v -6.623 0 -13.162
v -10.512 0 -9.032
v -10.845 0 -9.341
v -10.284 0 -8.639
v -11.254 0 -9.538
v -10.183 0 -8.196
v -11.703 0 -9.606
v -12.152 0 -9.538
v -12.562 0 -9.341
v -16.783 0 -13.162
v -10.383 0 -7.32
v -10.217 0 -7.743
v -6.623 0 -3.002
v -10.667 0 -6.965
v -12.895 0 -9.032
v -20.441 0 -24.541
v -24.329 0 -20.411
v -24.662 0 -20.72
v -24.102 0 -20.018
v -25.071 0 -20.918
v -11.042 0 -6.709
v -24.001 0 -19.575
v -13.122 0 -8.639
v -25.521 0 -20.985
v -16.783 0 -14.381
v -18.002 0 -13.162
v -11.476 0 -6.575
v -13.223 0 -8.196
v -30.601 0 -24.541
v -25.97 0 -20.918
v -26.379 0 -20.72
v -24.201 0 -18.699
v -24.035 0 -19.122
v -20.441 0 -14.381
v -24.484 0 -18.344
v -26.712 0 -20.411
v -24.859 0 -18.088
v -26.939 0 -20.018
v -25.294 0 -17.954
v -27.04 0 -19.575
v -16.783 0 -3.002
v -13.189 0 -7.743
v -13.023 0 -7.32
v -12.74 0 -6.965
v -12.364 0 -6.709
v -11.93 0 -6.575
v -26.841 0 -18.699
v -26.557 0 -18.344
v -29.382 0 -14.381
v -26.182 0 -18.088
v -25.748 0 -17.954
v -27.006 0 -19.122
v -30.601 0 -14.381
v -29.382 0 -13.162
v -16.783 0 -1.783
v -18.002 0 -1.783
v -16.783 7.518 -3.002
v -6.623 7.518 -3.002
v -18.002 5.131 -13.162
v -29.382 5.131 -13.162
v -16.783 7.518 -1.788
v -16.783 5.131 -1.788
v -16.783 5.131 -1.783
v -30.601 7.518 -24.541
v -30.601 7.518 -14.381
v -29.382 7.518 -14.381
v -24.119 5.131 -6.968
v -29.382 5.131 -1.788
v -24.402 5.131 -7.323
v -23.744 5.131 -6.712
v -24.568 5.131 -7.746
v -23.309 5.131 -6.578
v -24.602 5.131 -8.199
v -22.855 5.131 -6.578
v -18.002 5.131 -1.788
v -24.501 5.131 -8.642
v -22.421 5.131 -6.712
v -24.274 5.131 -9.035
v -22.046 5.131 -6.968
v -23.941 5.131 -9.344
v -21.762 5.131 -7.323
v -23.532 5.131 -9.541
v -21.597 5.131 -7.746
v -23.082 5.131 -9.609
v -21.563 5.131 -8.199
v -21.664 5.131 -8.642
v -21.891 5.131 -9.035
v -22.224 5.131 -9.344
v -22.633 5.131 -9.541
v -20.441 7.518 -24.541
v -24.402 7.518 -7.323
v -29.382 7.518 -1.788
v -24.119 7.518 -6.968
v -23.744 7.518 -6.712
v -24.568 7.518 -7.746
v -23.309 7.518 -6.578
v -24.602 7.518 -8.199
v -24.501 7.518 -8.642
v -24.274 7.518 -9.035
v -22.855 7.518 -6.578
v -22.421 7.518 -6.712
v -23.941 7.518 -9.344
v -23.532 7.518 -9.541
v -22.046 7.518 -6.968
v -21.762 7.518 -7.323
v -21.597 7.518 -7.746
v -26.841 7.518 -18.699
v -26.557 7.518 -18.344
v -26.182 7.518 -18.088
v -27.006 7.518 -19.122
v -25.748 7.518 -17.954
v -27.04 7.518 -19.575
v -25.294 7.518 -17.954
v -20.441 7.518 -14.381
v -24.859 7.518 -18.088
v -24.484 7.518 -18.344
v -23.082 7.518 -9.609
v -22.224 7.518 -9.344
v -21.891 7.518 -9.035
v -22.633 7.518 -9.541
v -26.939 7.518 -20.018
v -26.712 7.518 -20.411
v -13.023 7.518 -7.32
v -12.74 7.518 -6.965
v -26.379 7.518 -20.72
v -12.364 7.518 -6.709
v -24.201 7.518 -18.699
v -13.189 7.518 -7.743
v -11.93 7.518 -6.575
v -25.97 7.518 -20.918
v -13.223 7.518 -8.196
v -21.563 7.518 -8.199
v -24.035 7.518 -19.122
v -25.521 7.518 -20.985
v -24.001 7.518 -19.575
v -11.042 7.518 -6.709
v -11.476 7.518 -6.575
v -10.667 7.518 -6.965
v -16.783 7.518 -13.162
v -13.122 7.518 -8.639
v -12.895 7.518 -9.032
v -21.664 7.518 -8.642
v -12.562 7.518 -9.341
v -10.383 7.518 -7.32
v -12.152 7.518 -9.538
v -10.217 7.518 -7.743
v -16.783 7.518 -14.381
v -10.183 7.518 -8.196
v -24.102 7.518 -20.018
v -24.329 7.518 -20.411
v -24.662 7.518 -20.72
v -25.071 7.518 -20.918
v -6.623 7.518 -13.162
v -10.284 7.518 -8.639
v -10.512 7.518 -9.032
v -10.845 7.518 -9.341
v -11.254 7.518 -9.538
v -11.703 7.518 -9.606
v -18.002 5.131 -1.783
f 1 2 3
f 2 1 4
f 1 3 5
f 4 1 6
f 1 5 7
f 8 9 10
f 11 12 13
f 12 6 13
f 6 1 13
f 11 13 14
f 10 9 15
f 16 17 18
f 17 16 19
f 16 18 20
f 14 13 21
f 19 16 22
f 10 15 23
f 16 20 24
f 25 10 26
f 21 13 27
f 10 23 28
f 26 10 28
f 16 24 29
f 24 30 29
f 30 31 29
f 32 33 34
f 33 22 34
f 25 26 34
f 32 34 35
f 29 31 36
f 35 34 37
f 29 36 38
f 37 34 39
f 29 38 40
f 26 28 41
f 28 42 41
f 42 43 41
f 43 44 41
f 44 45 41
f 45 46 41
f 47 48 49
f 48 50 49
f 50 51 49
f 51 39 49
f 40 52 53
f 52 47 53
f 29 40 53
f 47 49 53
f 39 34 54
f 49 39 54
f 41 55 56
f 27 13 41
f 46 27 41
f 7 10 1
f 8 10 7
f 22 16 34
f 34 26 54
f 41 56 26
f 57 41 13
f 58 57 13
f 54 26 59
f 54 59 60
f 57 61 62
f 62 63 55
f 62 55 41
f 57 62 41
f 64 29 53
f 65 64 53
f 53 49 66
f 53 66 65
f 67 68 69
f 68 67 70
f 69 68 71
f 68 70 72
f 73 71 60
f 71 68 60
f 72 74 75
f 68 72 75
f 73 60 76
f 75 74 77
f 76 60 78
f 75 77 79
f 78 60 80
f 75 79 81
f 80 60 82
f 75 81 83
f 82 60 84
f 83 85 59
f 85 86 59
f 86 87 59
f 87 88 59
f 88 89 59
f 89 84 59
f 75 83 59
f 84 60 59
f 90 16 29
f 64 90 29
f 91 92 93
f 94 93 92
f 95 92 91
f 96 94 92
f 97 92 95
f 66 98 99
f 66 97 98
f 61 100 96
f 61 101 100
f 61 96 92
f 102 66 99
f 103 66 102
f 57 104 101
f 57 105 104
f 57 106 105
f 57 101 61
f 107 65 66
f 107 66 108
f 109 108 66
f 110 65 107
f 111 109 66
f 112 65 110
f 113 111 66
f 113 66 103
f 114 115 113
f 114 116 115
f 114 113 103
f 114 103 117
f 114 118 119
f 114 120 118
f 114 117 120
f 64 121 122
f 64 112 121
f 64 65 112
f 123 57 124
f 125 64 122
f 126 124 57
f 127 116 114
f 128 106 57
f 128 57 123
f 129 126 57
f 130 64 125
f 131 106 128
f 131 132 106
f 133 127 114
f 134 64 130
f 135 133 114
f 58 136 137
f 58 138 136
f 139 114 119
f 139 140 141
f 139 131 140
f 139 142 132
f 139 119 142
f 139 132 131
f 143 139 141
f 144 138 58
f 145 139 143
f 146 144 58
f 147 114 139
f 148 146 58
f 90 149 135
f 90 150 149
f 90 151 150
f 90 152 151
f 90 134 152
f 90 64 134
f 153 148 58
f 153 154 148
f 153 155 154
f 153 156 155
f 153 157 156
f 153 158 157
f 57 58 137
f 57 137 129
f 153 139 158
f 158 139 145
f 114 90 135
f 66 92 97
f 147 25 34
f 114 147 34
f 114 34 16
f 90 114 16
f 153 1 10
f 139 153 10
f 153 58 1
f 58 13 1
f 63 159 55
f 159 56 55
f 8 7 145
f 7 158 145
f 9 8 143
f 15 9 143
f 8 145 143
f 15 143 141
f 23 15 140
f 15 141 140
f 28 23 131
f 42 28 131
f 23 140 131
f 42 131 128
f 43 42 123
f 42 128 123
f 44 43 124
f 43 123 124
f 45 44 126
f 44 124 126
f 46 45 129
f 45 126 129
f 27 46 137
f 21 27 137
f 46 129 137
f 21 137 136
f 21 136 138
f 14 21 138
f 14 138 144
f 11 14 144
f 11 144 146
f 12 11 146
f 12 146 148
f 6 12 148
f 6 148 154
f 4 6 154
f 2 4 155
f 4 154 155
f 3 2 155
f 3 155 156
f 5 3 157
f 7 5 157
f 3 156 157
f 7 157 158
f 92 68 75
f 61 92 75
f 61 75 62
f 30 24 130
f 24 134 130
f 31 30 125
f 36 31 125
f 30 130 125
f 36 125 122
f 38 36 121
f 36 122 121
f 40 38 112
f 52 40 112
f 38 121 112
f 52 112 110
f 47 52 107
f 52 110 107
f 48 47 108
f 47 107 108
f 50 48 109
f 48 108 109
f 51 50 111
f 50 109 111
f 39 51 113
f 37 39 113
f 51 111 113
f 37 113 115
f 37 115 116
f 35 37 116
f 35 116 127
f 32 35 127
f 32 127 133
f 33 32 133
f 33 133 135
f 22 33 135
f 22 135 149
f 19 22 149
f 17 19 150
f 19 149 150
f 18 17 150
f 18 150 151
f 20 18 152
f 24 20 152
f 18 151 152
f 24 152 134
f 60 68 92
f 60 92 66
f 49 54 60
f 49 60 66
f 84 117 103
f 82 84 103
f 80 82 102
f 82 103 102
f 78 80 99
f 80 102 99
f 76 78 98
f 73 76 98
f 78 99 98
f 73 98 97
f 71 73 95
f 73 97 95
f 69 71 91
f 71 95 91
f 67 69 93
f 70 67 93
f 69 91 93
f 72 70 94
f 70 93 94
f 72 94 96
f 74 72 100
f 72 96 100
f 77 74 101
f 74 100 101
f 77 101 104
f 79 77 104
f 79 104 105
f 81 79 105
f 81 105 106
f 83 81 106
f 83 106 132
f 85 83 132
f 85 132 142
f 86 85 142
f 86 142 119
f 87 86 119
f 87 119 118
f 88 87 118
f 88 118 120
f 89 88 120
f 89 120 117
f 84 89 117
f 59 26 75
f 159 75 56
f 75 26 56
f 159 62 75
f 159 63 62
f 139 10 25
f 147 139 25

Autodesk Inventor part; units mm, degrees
ref_plane "YZ Plane" through (0, 0, 0) normal (1, 0, 0) x (0, 1, 0)
ref_plane "XZ Plane" through (0, 0, 0) normal (0, 1, 0) x (-1, 0, 0)
ref_plane "XY Plane" through (0, 0, 0) normal (0, 0, 1) x (1, 0, 0)
sketch "Sketch1" plane through (0, 0, 0) normal (0, 1, 0) x (-1, 0, 0)
  line L0 (16.7831, -1.7829) -> (16.7831, -14.3813)
  line L1 (16.7831, -14.3813) -> (29.3815, -14.3813)
  line L2 (28.1623, -3.0021) -> (18.0023, -3.0021)
  line L3 (18.0023, -3.0021) -> (18.0023, -13.1621)
  line L4 (18.0023, -13.1621) -> (28.1623, -13.1621)
  line L5 (28.1623, -13.1621) -> (28.1623, -3.0021)
  line L6 (28.1623, -3.0021) -> (29.3815, -3.0021)
  line L7 (30.6007, -14.3813) -> (20.4407, -14.3813)
  line L8 (20.4407, -14.3813) -> (20.4407, -24.5413)
  line L9 (20.4407, -24.5413) -> (30.6007, -24.5413)
  line L10 (30.6007, -24.5413) -> (30.6007, -14.3813)
  line L11 (16.7831, -3.0021) -> (6.6231, -3.0021)
  line L12 (6.6231, -3.0021) -> (6.6231, -13.1621)
  line L13 (6.6231, -13.1621) -> (16.7831, -13.1621)
  line L14 (16.7831, -13.1621) -> (16.7831, -3.0021)
  line L15 (28.1623, -13.1621) -> (29.3815, -13.1621)
  line L16 (18.0023, -3.0021) -> (18.0023, -1.7829)
  line L17 (29.3815, -13.1621) -> (29.3815, -14.3813)
  line L18 (18.0023, -1.7829) -> (16.7831, -1.7829)
  line L19 (18.0023, -1.7829) -> (16.7831, -1.7829)
  circle A0 centre (25.5207, -19.4613) radius 1.524
  circle A1 centre (11.7031, -8.0821) radius 1.524
  point P0 (0, 0)
  dimension "d16" = 3.048
  dimension "d17" = 3.048
extrude "Extrusion1" add sketch "Sketch1" along normal blind 5.1308 contours L18 L16 L3 L4 L15 L17 L1 L0
sketch "Sketch2" plane through (0, 5.1308, 0) normal (0, 1, 0) x (1, 0, 0)
  line L0 (-16.7831, 14.3813) -> (-29.3815, 14.3813) projected
  line L1 (-16.7831, 14.3813) -> (-29.3815, 14.3813)
  line L2 (-29.3815, 14.3813) -> (-29.3815, 1.7884)
  line L3 (-29.3815, 1.7884) -> (-16.7831, 1.7884)
  line L4 (-16.7831, 1.7884) -> (-16.7831, 14.3813)
  circle A0 centre (-23.0823, 8.0848) radius 1.524
  point P0 (0, 0)
  dimension "d4" = 3.048
extrude "Extrusion2" add sketch "Sketch2" along normal blind 2.3876 contours L4 L3 L2 L0 | A0
hole "Hole1" at (-23.0823, 5.1308, -8.0848) direction (0, 1, 0) diameter 3.048 end through all
extrude "Extrusion3" add sketch "Sketch1" along normal blind 7.5184 contours L1 L7 L10 L9 L8 | A0
extrude "Extrusion4" add sketch "Sketch1" along normal blind 7.5184 contours L0 L13 L12 L11 | A1
hole "Hole2" at (-11.7031, 0, -8.0821) direction (0, 1, 0) diameter 3.048 end through all
hole "Hole3" at (-25.5207, 0, -19.4613) direction (0, 1, 0) diameter 3.048 end through all
properties part number "tab"
